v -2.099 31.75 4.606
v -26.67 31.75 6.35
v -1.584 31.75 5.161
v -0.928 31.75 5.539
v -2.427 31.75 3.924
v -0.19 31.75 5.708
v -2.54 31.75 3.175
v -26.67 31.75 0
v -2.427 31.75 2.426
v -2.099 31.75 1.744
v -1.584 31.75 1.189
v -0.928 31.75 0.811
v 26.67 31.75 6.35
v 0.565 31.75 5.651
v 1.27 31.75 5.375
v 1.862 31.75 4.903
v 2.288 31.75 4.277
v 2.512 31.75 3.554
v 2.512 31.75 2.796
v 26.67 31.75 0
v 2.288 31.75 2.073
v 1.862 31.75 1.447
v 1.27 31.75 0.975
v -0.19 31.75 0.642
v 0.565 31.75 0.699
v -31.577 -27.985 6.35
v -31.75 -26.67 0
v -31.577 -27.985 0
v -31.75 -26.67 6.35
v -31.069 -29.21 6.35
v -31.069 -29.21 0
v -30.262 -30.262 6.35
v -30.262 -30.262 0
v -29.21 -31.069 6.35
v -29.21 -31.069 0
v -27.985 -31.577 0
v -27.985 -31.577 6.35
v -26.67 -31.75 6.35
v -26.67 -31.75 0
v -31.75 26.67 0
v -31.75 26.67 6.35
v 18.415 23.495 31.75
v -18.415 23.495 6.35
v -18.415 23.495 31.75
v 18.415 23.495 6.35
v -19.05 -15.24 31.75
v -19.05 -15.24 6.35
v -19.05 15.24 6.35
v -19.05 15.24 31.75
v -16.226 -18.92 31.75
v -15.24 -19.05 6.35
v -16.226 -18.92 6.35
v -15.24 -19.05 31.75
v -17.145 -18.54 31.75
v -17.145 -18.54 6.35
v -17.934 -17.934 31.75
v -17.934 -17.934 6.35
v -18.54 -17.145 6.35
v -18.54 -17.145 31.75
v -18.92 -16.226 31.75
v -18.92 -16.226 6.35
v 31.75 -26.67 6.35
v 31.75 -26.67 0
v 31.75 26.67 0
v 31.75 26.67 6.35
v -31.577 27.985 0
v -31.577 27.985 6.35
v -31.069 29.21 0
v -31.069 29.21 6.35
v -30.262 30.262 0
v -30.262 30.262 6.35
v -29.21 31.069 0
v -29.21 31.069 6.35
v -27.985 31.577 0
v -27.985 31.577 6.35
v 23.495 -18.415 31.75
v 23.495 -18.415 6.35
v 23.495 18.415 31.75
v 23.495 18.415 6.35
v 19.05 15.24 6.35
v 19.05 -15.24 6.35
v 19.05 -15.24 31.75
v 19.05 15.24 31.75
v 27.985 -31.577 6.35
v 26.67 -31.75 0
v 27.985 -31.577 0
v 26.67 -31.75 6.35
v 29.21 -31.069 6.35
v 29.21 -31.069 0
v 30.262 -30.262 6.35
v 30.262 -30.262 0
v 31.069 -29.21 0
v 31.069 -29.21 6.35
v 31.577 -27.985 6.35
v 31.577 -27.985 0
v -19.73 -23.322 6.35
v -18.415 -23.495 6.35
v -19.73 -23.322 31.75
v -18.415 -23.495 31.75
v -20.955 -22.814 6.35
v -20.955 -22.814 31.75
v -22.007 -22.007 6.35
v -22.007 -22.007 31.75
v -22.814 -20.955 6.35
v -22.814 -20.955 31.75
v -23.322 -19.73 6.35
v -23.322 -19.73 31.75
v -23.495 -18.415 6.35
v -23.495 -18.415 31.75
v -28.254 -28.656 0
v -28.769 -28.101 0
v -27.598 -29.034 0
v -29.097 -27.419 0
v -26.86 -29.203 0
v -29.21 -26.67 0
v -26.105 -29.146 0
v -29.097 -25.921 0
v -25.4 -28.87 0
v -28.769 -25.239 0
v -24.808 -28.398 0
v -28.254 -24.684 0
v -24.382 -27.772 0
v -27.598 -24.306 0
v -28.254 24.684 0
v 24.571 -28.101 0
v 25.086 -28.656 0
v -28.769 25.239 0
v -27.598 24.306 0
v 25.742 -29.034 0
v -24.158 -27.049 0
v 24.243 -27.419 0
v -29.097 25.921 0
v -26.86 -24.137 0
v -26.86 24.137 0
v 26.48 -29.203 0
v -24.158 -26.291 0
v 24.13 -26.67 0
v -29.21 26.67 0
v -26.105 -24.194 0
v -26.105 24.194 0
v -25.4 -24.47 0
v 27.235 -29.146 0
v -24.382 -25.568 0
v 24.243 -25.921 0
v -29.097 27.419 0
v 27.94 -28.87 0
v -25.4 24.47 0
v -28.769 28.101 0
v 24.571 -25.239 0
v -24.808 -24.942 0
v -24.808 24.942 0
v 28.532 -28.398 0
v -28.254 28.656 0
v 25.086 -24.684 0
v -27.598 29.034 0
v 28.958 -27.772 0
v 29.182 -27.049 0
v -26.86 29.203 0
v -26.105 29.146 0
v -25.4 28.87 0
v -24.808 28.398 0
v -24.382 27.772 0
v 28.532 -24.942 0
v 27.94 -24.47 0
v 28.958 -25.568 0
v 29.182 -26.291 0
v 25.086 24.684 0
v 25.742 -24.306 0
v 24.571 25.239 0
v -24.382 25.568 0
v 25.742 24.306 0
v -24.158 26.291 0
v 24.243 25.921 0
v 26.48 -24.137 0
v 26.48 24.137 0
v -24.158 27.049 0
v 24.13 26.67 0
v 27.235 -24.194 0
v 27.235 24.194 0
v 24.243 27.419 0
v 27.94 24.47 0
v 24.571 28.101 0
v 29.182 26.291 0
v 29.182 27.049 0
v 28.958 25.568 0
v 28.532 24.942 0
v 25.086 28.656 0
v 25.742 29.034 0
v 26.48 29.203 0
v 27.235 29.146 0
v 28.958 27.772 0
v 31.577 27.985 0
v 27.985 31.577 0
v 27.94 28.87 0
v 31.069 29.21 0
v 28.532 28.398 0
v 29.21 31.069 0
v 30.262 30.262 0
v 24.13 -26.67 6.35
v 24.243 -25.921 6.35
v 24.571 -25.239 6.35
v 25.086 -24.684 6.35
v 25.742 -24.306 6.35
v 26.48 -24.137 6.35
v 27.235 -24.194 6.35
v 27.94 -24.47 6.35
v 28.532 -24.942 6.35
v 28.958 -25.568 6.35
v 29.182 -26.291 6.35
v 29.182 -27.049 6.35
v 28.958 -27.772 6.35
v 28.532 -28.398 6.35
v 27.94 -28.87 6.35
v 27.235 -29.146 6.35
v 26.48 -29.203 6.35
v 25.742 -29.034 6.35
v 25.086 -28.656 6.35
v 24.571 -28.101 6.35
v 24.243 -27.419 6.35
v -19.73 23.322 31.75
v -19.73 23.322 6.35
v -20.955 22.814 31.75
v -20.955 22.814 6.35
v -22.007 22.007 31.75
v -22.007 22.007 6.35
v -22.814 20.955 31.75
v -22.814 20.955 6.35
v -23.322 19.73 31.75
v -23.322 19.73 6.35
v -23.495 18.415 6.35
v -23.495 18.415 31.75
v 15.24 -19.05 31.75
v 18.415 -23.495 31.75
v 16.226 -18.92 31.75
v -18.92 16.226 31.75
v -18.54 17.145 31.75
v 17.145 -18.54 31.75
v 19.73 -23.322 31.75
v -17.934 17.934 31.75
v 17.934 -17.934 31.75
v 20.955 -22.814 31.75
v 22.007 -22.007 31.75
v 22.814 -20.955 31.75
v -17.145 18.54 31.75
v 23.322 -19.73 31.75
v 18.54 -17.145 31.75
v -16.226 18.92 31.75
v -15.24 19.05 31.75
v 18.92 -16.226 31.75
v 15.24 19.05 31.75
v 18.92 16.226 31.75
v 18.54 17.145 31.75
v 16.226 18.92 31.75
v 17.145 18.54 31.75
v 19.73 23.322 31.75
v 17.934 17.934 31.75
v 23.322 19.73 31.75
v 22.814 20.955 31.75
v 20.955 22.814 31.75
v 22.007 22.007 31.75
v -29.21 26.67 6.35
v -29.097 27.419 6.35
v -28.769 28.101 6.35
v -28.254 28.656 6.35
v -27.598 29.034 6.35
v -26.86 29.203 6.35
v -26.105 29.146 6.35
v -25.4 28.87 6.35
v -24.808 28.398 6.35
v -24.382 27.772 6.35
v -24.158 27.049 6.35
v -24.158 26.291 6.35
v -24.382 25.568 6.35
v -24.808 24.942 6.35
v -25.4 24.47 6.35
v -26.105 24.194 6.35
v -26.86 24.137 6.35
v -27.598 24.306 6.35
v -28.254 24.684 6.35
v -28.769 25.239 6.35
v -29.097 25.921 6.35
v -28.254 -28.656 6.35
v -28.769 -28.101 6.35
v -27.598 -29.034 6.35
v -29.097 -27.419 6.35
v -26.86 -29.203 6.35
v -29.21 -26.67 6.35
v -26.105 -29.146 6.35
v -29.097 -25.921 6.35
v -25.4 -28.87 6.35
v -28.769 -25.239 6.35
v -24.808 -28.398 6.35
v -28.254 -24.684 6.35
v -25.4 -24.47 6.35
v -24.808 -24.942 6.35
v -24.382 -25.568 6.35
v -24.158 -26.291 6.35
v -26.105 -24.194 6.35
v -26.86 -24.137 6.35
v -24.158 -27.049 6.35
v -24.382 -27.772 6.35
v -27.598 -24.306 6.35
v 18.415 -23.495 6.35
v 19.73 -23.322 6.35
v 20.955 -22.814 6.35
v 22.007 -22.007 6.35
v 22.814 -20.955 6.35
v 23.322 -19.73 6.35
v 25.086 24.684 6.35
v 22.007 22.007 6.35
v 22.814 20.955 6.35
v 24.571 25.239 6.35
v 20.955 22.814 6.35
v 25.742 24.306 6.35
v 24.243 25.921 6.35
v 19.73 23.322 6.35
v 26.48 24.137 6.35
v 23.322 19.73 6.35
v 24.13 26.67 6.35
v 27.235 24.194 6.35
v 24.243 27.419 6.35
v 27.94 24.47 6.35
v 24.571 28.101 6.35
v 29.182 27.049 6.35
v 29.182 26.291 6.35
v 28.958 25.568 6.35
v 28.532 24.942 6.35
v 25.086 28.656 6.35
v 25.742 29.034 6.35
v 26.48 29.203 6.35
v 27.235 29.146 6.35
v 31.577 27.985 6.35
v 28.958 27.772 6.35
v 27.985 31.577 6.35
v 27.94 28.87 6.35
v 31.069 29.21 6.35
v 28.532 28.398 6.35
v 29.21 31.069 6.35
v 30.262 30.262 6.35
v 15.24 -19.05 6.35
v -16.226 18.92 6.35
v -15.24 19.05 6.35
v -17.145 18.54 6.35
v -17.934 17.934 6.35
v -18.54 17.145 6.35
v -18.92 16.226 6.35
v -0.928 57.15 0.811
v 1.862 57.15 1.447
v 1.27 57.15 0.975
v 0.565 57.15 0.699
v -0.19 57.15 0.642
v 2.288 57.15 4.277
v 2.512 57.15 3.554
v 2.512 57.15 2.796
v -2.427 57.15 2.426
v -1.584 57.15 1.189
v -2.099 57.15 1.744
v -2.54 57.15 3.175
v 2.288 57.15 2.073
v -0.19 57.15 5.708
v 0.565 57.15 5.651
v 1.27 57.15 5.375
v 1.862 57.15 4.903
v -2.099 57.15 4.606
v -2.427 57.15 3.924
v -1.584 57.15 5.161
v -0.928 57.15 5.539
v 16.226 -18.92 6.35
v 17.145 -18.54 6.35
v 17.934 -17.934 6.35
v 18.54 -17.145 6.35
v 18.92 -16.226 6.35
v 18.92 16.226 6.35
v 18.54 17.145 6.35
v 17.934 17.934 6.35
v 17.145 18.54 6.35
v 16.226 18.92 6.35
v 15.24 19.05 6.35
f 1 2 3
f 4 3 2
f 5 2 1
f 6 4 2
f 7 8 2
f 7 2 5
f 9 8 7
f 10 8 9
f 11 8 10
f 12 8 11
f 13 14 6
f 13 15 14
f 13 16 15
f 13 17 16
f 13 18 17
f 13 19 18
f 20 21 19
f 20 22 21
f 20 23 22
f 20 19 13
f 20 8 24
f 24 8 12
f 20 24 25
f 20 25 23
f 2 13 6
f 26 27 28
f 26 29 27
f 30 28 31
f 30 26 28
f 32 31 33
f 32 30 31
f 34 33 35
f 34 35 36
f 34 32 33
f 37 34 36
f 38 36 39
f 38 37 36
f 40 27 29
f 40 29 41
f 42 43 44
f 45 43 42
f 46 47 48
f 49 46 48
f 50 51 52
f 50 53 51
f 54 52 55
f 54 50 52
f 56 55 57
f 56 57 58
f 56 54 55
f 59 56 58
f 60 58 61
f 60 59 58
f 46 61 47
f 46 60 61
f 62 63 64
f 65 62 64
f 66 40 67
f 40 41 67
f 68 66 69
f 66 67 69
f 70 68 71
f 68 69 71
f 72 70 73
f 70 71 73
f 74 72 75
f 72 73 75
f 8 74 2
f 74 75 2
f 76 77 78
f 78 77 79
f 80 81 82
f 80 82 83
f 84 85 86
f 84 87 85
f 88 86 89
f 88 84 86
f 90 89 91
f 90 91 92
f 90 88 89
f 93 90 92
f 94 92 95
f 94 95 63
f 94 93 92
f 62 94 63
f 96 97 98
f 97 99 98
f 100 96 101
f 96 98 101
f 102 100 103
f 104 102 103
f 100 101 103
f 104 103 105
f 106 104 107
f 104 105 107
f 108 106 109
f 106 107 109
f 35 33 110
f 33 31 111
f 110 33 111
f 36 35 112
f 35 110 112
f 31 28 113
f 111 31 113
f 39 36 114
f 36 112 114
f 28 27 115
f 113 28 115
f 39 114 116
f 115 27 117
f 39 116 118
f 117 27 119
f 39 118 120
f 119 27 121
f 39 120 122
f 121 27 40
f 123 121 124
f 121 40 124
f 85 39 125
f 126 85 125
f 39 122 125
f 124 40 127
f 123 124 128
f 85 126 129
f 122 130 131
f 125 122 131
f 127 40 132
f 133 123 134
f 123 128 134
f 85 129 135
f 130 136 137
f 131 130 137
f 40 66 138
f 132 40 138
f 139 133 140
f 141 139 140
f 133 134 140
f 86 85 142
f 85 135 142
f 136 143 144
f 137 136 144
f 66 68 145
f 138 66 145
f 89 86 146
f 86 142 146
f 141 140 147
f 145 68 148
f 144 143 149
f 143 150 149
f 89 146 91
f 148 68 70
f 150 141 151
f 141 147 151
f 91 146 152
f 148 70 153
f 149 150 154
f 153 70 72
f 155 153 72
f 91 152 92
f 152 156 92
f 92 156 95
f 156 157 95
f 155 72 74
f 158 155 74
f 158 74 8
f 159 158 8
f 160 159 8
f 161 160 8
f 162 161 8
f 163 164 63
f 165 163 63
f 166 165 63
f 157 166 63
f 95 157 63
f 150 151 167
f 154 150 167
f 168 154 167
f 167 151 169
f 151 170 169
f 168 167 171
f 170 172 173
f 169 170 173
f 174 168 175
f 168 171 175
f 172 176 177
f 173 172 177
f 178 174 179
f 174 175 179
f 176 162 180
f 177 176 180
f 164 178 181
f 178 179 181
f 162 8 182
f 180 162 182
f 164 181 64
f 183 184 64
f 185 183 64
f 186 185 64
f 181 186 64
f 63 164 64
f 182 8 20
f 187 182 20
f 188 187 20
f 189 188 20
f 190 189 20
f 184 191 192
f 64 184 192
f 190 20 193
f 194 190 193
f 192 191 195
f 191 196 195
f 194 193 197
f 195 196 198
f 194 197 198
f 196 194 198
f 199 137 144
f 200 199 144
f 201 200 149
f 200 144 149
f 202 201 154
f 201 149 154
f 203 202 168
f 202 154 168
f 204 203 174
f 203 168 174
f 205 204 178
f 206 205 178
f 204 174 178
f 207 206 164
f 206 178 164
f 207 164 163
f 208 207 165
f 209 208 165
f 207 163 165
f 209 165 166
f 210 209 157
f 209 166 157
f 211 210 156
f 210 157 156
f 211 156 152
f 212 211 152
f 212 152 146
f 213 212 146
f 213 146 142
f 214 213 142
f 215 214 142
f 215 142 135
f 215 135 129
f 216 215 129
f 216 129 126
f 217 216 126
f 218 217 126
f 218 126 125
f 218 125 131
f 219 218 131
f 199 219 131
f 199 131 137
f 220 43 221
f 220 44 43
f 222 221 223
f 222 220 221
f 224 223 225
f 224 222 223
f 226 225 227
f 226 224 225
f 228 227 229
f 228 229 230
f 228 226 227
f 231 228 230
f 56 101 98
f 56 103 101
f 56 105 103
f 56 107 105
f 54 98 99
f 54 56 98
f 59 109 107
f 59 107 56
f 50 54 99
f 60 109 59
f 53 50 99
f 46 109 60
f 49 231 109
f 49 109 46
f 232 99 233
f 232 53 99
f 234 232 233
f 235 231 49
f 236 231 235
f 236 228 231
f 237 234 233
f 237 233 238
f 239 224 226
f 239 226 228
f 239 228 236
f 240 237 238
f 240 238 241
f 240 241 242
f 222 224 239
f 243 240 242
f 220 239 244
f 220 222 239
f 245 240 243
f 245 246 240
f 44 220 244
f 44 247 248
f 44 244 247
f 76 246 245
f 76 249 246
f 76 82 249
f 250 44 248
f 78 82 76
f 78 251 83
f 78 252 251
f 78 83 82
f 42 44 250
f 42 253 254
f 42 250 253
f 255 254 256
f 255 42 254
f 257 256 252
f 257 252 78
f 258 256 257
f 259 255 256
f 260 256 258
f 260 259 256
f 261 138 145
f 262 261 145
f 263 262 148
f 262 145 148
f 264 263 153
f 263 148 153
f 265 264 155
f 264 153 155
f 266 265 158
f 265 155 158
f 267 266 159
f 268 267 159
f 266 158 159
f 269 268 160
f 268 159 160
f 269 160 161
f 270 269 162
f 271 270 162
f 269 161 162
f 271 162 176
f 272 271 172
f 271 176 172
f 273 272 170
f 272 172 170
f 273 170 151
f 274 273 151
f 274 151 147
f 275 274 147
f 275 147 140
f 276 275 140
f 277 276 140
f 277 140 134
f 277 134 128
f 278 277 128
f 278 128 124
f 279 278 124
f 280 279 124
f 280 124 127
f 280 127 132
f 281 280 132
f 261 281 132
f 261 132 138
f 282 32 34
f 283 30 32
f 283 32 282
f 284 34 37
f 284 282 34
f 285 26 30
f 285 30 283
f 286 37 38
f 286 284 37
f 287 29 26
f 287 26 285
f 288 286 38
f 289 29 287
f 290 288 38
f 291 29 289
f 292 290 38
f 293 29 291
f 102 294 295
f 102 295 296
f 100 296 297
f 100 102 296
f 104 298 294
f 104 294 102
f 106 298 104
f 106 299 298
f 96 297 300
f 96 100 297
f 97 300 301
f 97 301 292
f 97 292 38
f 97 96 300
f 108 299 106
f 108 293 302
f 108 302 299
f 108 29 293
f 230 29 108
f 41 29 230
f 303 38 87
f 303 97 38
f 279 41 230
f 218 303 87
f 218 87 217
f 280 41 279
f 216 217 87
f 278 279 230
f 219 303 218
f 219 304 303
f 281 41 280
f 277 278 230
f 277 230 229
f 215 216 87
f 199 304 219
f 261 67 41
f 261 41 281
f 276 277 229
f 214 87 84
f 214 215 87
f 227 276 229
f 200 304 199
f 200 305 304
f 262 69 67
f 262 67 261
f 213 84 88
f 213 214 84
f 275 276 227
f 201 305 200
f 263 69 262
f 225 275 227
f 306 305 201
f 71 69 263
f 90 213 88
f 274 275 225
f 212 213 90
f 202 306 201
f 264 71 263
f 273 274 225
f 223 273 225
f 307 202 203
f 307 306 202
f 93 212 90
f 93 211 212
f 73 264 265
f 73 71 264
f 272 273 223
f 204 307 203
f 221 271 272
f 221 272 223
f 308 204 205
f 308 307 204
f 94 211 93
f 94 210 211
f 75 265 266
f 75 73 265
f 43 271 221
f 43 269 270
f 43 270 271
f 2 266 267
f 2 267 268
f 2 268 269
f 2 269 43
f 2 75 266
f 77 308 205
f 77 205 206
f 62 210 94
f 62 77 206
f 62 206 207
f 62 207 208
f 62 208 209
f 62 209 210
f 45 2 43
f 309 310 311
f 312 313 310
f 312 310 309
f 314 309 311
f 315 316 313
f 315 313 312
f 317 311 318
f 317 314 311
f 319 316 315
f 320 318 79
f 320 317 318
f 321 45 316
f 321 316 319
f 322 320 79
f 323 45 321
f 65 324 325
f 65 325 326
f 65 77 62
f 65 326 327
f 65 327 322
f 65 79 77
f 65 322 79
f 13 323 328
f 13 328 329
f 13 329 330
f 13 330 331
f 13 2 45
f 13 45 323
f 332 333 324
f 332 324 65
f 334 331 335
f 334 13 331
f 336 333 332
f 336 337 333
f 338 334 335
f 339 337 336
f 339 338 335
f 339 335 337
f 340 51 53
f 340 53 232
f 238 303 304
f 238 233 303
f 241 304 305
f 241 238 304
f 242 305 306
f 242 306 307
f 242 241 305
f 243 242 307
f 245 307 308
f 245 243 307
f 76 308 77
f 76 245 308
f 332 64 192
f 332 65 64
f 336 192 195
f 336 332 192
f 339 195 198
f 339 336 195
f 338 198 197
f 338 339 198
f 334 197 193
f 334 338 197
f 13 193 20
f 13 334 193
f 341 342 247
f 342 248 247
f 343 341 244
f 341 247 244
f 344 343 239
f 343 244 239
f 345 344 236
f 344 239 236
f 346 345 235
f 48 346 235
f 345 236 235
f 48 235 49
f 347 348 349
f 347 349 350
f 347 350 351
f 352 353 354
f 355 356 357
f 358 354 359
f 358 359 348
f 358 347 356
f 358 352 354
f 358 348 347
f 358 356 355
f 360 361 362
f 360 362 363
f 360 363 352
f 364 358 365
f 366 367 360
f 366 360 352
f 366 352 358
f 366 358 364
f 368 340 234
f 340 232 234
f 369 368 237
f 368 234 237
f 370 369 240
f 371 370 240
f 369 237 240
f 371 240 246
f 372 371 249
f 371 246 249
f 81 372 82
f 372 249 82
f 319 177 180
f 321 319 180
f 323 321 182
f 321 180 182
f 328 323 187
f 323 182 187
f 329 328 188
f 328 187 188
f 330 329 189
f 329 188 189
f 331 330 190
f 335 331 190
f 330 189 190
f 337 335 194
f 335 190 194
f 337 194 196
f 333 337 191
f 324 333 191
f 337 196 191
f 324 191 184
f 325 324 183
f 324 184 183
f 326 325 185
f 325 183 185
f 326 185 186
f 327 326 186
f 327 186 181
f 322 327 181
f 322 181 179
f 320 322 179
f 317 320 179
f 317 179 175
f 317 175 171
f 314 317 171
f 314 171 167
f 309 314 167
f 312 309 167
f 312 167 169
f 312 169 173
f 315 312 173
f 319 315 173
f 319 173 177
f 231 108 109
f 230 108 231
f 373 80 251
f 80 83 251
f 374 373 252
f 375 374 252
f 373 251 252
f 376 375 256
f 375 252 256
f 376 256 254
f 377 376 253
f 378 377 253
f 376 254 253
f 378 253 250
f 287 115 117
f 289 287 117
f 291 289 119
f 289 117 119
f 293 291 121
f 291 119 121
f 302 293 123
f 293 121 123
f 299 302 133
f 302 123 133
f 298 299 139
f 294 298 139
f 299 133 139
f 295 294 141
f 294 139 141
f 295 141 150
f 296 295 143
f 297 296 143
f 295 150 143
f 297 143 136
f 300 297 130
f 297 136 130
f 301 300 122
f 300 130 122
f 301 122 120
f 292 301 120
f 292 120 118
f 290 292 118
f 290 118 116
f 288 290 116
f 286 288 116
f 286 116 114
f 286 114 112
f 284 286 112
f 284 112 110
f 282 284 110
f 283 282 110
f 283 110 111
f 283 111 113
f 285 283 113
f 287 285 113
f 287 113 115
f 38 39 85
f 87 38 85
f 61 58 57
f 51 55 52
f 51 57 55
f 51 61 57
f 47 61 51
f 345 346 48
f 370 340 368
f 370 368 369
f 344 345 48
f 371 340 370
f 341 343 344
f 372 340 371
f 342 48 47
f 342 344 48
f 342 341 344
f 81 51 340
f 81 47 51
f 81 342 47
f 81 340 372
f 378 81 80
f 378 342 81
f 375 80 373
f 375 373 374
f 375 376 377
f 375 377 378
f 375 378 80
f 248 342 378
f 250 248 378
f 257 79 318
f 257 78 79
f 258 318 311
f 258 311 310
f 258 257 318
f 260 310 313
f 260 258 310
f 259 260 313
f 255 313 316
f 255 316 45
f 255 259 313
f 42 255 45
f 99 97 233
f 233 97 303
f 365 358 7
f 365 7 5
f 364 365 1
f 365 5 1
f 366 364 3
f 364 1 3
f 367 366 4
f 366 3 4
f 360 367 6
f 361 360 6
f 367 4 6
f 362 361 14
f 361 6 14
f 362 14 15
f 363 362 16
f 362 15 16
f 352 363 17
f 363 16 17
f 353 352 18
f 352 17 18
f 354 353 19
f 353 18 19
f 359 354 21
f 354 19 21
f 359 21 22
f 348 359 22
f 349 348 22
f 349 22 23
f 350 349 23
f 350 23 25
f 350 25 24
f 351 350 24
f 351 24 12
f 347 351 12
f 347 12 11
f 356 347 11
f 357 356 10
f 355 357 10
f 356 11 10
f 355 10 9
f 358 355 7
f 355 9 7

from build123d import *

# Parameters (mm, degrees)
F0_W     = 63.5
F0_H     = 63.5
F1_DEPTH = 6.35
F2_R     = 5.08
F4_D     = 5.08
F5_R     = 2.54
F6_DEPTH = 25.4
F7_W     = 46.99
F7_H     = 46.99
F7_W_2   = 38.1
F7_H_2   = 38.1
F8_DEPTH = 25.4
F9_R     = 5.08
F10_R    = 3.81


with BuildPart() as f1:
    # F0 (on Top) → F1 (new body)
    with BuildSketch(Plane.XY):
        Rectangle(F0_W, F0_H)
    extrude(amount=F1_DEPTH)

    # F2
    f2_edges = [f1.edges().sort_by_distance(p)[0] for p in [
        (-31.75, -31.75, 3.175),
        (31.75, -31.75, 3.175),
        (31.75, 31.75, 3.175),
        (-31.75, 31.75, 3.175),
    ]]
    fillet(f2_edges, radius=F2_R)

    # F4 (through all)
    with Locations(Plane.XY.offset(6.35)):
        with Locations((-26.67, 26.67), (26.67, 26.67), (26.67, -26.67), (-26.67, -26.67)):
            Hole(F4_D / 2)

    # F5 (on face) → F6 (join)
    with BuildSketch(Plane(origin=(0, 31.75, 0), x_dir=(-1, 0, 0), z_dir=(0, 1, 0))):
        with Locations((0, 3.175)):
            Circle(F5_R)
    extrude(amount=F6_DEPTH)

    # F7 (on face) → F8 (join)
    with BuildSketch(Plane.XY.offset(6.35)):
        Rectangle(F7_W, F7_H)
        Rectangle(F7_W_2, F7_H_2, mode=Mode.SUBTRACT)
    extrude(amount=F8_DEPTH)

    # F9
    f9_edges = [f1.edges().sort_by_distance(p)[0] for p in [
        (-23.495, -23.495, 19.05),
        (23.495, -23.495, 19.05),
        (23.495, 23.495, 19.05),
        (-23.495, 23.495, 19.05),
    ]]
    fillet(f9_edges, radius=F9_R)

    # F10
    f10_edges = [f1.edges().sort_by_distance(p)[0] for p in [
        (19.05, 19.05, 19.05),
        (-19.05, 19.05, 19.05),
        (-19.05, -19.05, 19.05),
        (19.05, -19.05, 19.05),
    ]]
    fillet(f10_edges, radius=F10_R)


solid = f1.part
